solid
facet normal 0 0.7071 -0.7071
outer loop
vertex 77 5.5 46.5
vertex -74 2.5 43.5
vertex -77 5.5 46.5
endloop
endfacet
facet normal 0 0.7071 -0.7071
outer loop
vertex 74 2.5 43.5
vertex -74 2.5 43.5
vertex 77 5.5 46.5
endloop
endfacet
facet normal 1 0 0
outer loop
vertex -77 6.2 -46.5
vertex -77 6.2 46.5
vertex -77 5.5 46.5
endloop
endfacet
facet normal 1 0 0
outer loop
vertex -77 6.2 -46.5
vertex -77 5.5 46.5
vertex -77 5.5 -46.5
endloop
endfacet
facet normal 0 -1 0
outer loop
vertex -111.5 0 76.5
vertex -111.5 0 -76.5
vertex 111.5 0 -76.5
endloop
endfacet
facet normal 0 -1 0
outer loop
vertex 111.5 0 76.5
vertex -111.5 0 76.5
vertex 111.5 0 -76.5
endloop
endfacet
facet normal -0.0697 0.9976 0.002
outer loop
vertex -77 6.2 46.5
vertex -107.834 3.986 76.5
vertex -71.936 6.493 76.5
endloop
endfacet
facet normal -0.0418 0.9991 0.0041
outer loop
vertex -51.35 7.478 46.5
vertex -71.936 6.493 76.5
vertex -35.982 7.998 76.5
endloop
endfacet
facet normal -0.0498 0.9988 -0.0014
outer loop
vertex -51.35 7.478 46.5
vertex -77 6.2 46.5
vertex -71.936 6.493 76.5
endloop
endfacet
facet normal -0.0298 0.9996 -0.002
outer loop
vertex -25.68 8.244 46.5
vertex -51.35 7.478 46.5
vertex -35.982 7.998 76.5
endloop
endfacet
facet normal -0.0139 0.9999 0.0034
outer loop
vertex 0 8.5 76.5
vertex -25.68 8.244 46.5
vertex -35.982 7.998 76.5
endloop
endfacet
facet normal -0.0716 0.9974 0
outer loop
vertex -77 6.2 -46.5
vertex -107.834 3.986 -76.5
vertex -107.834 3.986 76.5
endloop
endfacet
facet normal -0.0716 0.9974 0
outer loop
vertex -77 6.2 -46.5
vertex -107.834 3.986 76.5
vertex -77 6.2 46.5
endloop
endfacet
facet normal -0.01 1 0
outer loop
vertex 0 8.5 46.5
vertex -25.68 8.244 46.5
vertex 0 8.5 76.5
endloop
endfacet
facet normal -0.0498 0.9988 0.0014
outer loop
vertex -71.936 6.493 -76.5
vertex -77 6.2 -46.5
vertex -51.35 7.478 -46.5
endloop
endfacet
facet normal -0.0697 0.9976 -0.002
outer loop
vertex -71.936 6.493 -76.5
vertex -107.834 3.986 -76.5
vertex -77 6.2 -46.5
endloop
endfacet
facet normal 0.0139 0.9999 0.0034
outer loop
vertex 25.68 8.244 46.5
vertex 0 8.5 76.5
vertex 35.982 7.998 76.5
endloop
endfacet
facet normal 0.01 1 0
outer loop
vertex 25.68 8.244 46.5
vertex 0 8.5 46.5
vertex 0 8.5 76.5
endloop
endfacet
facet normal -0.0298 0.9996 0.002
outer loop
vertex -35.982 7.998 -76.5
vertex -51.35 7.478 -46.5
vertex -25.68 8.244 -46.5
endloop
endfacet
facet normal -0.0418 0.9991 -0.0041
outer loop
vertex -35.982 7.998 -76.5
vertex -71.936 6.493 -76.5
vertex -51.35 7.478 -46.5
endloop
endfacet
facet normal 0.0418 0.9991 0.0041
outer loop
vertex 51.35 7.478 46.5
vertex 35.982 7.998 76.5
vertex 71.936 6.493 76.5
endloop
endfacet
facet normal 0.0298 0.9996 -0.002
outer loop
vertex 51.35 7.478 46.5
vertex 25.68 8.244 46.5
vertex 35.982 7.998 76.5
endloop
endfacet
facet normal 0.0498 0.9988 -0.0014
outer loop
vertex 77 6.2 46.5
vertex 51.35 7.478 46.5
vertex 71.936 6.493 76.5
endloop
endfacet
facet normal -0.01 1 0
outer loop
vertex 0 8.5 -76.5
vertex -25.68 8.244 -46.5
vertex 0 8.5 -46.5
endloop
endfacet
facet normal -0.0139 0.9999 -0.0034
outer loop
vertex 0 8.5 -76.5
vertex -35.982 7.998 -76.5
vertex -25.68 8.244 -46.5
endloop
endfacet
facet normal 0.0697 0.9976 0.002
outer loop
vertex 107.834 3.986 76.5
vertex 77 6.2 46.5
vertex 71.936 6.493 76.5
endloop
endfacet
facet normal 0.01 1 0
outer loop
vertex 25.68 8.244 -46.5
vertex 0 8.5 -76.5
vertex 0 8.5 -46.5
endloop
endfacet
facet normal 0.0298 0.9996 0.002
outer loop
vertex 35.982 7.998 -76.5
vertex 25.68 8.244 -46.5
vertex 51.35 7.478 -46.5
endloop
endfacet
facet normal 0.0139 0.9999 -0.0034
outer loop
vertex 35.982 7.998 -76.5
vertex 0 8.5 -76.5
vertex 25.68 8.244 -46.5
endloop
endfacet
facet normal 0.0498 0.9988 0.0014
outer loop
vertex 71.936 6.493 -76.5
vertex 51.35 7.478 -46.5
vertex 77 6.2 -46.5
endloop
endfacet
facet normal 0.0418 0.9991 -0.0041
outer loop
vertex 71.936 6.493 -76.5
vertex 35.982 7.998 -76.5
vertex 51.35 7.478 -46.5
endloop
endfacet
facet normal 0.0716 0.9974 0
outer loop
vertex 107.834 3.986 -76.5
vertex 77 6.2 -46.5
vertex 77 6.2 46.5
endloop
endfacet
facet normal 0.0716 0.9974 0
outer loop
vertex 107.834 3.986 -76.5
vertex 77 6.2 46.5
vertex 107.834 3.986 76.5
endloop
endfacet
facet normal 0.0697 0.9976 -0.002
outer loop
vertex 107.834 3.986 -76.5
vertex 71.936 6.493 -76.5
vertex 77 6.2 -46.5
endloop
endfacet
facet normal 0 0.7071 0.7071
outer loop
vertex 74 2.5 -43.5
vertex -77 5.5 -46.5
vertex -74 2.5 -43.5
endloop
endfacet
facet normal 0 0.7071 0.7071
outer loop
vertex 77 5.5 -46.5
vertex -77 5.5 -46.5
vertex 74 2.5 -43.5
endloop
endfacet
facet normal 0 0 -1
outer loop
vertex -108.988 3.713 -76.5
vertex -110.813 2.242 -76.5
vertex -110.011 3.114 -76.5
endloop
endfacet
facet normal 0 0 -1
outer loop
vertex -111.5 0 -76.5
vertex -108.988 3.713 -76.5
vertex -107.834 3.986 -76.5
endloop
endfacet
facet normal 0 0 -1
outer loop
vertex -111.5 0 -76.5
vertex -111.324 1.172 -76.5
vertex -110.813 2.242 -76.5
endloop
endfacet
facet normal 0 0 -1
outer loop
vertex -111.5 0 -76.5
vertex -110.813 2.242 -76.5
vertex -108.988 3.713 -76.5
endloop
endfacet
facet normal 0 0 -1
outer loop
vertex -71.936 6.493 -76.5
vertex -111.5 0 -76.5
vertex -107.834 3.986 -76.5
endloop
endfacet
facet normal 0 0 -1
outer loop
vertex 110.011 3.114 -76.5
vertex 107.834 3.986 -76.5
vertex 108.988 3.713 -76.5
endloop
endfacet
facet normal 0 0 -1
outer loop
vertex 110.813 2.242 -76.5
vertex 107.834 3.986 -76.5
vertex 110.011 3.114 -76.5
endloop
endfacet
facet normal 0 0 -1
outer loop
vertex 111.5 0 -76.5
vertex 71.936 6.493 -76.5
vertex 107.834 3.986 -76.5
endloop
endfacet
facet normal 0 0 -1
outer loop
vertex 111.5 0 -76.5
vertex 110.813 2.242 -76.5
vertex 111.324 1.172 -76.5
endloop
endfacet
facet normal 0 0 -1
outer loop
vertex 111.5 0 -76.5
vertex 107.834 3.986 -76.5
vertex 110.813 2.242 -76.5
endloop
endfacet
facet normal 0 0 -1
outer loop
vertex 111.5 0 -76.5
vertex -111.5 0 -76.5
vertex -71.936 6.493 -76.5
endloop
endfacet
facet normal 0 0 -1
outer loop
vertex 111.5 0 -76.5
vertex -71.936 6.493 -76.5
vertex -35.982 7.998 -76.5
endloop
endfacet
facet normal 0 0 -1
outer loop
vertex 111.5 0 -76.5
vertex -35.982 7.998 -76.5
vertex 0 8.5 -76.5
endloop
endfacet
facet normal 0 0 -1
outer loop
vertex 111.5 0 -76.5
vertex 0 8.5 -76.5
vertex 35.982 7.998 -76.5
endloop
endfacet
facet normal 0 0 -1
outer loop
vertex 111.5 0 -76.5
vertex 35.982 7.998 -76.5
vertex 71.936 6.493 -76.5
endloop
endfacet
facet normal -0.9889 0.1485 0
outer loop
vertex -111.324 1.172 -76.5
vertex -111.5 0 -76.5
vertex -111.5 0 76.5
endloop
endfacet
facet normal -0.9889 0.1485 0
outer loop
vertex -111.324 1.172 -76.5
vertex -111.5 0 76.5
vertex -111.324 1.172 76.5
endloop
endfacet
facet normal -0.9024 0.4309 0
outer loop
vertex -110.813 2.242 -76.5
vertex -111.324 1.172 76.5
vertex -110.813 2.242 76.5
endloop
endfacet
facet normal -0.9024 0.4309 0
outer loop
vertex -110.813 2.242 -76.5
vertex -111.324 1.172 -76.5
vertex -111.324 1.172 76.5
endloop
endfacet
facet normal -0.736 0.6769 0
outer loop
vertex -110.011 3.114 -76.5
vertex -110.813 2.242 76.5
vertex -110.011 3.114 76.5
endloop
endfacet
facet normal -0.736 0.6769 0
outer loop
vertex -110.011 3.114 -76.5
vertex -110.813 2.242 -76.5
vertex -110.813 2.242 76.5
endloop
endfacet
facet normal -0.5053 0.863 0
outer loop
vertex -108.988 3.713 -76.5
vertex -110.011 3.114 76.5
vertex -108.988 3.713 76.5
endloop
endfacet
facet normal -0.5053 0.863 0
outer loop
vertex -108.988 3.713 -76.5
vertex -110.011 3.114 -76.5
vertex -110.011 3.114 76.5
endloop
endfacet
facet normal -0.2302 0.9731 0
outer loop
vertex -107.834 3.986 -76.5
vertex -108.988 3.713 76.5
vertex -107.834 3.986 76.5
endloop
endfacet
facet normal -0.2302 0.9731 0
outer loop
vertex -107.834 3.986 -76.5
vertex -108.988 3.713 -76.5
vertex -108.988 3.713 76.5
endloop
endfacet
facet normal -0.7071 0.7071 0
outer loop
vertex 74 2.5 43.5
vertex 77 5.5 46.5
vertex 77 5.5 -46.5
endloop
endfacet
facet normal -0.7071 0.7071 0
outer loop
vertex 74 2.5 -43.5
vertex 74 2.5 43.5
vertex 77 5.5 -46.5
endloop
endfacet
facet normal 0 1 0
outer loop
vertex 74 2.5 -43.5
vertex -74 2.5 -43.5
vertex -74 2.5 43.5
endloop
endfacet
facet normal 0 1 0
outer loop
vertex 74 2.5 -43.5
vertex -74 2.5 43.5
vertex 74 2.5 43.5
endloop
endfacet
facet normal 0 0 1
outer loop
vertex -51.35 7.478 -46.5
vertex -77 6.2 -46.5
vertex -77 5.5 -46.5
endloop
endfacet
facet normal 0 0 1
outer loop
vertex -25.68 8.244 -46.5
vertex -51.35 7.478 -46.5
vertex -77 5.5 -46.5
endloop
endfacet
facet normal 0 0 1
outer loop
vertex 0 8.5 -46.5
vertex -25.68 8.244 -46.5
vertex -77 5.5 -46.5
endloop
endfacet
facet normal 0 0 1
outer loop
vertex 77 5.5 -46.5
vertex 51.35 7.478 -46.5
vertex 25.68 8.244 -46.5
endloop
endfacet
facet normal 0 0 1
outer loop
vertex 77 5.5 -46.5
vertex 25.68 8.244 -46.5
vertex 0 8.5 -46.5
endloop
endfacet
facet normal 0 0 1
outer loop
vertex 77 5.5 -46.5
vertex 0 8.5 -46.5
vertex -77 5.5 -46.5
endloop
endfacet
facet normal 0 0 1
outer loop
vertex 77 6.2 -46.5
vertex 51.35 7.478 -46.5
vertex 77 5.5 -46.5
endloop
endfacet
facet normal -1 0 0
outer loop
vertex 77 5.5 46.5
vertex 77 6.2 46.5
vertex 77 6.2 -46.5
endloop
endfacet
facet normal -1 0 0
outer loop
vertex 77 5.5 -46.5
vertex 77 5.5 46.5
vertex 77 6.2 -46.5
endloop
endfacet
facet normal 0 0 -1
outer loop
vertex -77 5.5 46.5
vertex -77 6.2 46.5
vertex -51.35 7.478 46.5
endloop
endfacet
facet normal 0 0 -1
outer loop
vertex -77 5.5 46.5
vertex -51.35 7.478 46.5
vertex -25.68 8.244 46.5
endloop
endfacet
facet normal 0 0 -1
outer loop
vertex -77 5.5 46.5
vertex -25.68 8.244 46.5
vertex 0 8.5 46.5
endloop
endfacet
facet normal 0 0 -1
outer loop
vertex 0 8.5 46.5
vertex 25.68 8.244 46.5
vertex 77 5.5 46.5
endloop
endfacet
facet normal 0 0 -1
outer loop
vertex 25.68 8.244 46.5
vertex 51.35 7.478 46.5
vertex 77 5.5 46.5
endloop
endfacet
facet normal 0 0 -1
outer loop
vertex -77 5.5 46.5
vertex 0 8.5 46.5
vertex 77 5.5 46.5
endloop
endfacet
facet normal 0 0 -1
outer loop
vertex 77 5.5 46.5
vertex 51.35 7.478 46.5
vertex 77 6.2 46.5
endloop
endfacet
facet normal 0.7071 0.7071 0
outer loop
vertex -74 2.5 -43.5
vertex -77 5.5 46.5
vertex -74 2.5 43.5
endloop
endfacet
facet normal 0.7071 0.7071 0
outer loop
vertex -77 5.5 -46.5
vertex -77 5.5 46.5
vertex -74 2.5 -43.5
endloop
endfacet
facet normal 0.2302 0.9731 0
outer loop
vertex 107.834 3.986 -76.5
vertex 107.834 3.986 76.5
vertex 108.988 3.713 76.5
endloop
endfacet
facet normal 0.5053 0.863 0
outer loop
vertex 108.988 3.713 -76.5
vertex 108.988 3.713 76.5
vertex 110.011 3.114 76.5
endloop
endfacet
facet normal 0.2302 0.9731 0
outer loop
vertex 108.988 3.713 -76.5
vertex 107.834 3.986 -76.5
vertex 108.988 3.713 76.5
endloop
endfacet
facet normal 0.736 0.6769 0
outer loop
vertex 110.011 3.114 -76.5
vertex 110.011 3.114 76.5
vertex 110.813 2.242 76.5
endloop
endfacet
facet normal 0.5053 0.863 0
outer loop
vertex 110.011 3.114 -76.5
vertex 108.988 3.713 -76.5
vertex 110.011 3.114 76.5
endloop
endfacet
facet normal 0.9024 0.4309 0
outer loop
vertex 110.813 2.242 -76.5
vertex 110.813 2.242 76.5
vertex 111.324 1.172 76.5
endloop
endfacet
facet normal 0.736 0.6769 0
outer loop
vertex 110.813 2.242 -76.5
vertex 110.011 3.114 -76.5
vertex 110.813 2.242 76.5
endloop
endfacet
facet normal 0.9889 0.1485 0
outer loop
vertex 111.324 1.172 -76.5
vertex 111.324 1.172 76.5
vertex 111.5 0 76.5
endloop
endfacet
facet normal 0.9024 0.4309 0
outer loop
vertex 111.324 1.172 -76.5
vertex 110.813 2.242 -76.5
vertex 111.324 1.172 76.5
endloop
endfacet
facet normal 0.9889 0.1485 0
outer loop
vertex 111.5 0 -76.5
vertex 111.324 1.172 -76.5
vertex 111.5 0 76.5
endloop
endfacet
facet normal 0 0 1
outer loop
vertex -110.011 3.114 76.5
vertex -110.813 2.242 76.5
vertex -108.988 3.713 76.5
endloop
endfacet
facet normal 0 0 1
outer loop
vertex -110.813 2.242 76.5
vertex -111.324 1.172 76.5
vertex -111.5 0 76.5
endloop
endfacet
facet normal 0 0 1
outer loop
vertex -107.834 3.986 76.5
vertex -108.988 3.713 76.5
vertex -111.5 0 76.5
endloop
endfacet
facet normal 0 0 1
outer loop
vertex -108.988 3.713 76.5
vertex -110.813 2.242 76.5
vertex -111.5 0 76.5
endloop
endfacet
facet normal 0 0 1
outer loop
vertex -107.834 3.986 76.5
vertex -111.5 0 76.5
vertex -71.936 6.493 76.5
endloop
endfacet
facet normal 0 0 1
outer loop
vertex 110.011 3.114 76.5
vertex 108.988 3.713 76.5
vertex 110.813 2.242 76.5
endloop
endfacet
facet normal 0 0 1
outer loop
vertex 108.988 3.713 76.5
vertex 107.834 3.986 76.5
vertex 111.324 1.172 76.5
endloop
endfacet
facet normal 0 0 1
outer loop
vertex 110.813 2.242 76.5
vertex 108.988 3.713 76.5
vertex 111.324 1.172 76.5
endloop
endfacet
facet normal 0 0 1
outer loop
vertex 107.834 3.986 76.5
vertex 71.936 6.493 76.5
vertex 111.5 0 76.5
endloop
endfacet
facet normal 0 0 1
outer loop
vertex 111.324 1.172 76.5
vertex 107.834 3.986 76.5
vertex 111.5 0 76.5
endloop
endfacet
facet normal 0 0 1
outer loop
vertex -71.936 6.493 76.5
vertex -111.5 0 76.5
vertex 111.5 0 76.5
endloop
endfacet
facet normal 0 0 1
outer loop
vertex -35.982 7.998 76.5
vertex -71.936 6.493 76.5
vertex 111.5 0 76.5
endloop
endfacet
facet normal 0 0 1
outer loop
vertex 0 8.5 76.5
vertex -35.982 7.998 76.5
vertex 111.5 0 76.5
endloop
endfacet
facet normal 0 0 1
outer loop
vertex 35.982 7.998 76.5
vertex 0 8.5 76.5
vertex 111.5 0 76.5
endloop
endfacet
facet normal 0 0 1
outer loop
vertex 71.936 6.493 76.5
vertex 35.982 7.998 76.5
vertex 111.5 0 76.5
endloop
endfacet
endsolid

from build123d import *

# Parameters (mm, degrees)
SKETCH1_W                      = 223
SKETCH1_H                      = 153
BOSS_EXTRUDE2_DEPTH            = 8.5
SKETCH3_W                      = 154
SKETCH3_H                      = 93
CUT_EXTRUDE1_DEPTH             = 6
CUT_EXTRUDE3_REACH             = 137.487
CUT_EXTRUDE3_DIRECTION_2_REACH = 137.487
CHAMFER2_SIZE                  = 3


with BuildPart() as part:
    # Sketch1 → Boss-Extrude2 (new body)
    with BuildSketch(Plane(origin=(0, 0, 0), x_dir=(1, 0, 0), z_dir=(0, 1, 0))):
        Rectangle(SKETCH1_W, SKETCH1_H)
    extrude(amount=BOSS_EXTRUDE2_DEPTH)

    # Sketch3 → Cut-Extrude1 (cut)
    with BuildSketch(Plane(origin=(0, 8.5, 0), x_dir=(1, 0, 0), z_dir=(0, 1, 0))):
        Rectangle(SKETCH3_W, SKETCH3_H)
    extrude(amount=-CUT_EXTRUDE1_DEPTH, mode=Mode.SUBTRACT)

    # Cut-Extrude3: up to this face of the body (flat: up to its plane)
    cut_extrude3_end = Plane(part.part.faces().sort_by_distance((0, 4.25, -76.5))[0])
    # Sketch4 → Cut-Extrude3 (cut, up to the picked face)
    with BuildSketch(Plane.XY, mode=Mode.PRIVATE) as cut_extrude3_sk1:
        with BuildLine():
            Line((0, 8.5), (-111.5, 8.5))
            Line((-111.5, 8.5), (-111.5, 0))
            ThreePointArc((-111.5, 0), (-110.444247928, 2.707656577), (-107.834297931, 3.986006133))
            ThreePointArc((-107.834297931, 3.986006133), (-53.96436776, 7.371007599), (0, 8.5))
        make_face()
    cut_extrude3_tool1 = split(extrude(cut_extrude3_sk1.sketch, amount=-CUT_EXTRUDE3_REACH, mode=Mode.PRIVATE), bisect_by=cut_extrude3_end, keep=Keep.BOTH, mode=Mode.PRIVATE)
    # Sketch4 → Cut-Extrude3 (cut, up to the picked face)
    with BuildSketch(Plane.XY, mode=Mode.PRIVATE) as cut_extrude3_sk2:
        with BuildLine():
            Line((111.5, 8.5), (0, 8.5))
            ThreePointArc((0, 8.5), (53.96436776, 7.371007599), (107.834297931, 3.986006133))
            ThreePointArc((107.834297931, 3.986006133), (110.444247928, 2.707656577), (111.5, 0))
            Line((111.5, 0), (111.5, 8.5))
        make_face()
    cut_extrude3_tool2 = split(extrude(cut_extrude3_sk2.sketch, amount=-CUT_EXTRUDE3_REACH, mode=Mode.PRIVATE), bisect_by=cut_extrude3_end, keep=Keep.BOTH, mode=Mode.PRIVATE)
    add(cut_extrude3_tool1.solids().sort_by(Axis((-84.053137, 6.988854, 0), (0, 0, -1)))[0], mode=Mode.SUBTRACT)
    add(cut_extrude3_tool2.solids().sort_by(Axis((84.053137, 6.988854, 0), (0, 0, -1)))[0], mode=Mode.SUBTRACT)

    # Cut-Extrude3 direction 2: up to this face of the body (flat: up to its plane)
    cut_extrude3_direction_2_end = Plane(part.part.faces().sort_by_distance((0, 4.25, 76.5))[0])
    # Sketch4 → Cut-Extrude3 direction 2 (cut, up to the picked face)
    with BuildSketch(Plane.XY, mode=Mode.PRIVATE) as cut_extrude3_direction_2_sk1:
        with BuildLine():
            Line((0, 8.5), (-111.5, 8.5))
            Line((-111.5, 8.5), (-111.5, 0))
            ThreePointArc((-111.5, 0), (-110.444247928, 2.707656577), (-107.834297931, 3.986006133))
            ThreePointArc((-107.834297931, 3.986006133), (-53.96436776, 7.371007599), (0, 8.5))
        make_face()
    cut_extrude3_direction_2_tool1 = split(extrude(cut_extrude3_direction_2_sk1.sketch, amount=CUT_EXTRUDE3_DIRECTION_2_REACH, mode=Mode.PRIVATE), bisect_by=cut_extrude3_direction_2_end, keep=Keep.BOTH, mode=Mode.PRIVATE)
    # Sketch4 → Cut-Extrude3 direction 2 (cut, up to the picked face)
    with BuildSketch(Plane.XY, mode=Mode.PRIVATE) as cut_extrude3_direction_2_sk2:
        with BuildLine():
            Line((111.5, 8.5), (0, 8.5))
            ThreePointArc((0, 8.5), (53.96436776, 7.371007599), (107.834297931, 3.986006133))
            ThreePointArc((107.834297931, 3.986006133), (110.444247928, 2.707656577), (111.5, 0))
            Line((111.5, 0), (111.5, 8.5))
        make_face()
    cut_extrude3_direction_2_tool2 = split(extrude(cut_extrude3_direction_2_sk2.sketch, amount=CUT_EXTRUDE3_DIRECTION_2_REACH, mode=Mode.PRIVATE), bisect_by=cut_extrude3_direction_2_end, keep=Keep.BOTH, mode=Mode.PRIVATE)
    add(cut_extrude3_direction_2_tool1.solids().sort_by(Axis((-84.053137, 6.988854, 0), (0, 0, 1)))[0], mode=Mode.SUBTRACT)
    add(cut_extrude3_direction_2_tool2.solids().sort_by(Axis((84.053137, 6.988854, 0), (0, 0, 1)))[0], mode=Mode.SUBTRACT)

    # Chamfer2
    chamfer2_edges = [part.edges().sort_by_distance(p)[0] for p in [
        (77, 2.5, 0),
        (0, 2.5, 46.5),
        (-77, 2.5, 0),
        (0, 2.5, -46.5),
    ]]
    chamfer(chamfer2_edges, length=CHAMFER2_SIZE)


solid = part.part
